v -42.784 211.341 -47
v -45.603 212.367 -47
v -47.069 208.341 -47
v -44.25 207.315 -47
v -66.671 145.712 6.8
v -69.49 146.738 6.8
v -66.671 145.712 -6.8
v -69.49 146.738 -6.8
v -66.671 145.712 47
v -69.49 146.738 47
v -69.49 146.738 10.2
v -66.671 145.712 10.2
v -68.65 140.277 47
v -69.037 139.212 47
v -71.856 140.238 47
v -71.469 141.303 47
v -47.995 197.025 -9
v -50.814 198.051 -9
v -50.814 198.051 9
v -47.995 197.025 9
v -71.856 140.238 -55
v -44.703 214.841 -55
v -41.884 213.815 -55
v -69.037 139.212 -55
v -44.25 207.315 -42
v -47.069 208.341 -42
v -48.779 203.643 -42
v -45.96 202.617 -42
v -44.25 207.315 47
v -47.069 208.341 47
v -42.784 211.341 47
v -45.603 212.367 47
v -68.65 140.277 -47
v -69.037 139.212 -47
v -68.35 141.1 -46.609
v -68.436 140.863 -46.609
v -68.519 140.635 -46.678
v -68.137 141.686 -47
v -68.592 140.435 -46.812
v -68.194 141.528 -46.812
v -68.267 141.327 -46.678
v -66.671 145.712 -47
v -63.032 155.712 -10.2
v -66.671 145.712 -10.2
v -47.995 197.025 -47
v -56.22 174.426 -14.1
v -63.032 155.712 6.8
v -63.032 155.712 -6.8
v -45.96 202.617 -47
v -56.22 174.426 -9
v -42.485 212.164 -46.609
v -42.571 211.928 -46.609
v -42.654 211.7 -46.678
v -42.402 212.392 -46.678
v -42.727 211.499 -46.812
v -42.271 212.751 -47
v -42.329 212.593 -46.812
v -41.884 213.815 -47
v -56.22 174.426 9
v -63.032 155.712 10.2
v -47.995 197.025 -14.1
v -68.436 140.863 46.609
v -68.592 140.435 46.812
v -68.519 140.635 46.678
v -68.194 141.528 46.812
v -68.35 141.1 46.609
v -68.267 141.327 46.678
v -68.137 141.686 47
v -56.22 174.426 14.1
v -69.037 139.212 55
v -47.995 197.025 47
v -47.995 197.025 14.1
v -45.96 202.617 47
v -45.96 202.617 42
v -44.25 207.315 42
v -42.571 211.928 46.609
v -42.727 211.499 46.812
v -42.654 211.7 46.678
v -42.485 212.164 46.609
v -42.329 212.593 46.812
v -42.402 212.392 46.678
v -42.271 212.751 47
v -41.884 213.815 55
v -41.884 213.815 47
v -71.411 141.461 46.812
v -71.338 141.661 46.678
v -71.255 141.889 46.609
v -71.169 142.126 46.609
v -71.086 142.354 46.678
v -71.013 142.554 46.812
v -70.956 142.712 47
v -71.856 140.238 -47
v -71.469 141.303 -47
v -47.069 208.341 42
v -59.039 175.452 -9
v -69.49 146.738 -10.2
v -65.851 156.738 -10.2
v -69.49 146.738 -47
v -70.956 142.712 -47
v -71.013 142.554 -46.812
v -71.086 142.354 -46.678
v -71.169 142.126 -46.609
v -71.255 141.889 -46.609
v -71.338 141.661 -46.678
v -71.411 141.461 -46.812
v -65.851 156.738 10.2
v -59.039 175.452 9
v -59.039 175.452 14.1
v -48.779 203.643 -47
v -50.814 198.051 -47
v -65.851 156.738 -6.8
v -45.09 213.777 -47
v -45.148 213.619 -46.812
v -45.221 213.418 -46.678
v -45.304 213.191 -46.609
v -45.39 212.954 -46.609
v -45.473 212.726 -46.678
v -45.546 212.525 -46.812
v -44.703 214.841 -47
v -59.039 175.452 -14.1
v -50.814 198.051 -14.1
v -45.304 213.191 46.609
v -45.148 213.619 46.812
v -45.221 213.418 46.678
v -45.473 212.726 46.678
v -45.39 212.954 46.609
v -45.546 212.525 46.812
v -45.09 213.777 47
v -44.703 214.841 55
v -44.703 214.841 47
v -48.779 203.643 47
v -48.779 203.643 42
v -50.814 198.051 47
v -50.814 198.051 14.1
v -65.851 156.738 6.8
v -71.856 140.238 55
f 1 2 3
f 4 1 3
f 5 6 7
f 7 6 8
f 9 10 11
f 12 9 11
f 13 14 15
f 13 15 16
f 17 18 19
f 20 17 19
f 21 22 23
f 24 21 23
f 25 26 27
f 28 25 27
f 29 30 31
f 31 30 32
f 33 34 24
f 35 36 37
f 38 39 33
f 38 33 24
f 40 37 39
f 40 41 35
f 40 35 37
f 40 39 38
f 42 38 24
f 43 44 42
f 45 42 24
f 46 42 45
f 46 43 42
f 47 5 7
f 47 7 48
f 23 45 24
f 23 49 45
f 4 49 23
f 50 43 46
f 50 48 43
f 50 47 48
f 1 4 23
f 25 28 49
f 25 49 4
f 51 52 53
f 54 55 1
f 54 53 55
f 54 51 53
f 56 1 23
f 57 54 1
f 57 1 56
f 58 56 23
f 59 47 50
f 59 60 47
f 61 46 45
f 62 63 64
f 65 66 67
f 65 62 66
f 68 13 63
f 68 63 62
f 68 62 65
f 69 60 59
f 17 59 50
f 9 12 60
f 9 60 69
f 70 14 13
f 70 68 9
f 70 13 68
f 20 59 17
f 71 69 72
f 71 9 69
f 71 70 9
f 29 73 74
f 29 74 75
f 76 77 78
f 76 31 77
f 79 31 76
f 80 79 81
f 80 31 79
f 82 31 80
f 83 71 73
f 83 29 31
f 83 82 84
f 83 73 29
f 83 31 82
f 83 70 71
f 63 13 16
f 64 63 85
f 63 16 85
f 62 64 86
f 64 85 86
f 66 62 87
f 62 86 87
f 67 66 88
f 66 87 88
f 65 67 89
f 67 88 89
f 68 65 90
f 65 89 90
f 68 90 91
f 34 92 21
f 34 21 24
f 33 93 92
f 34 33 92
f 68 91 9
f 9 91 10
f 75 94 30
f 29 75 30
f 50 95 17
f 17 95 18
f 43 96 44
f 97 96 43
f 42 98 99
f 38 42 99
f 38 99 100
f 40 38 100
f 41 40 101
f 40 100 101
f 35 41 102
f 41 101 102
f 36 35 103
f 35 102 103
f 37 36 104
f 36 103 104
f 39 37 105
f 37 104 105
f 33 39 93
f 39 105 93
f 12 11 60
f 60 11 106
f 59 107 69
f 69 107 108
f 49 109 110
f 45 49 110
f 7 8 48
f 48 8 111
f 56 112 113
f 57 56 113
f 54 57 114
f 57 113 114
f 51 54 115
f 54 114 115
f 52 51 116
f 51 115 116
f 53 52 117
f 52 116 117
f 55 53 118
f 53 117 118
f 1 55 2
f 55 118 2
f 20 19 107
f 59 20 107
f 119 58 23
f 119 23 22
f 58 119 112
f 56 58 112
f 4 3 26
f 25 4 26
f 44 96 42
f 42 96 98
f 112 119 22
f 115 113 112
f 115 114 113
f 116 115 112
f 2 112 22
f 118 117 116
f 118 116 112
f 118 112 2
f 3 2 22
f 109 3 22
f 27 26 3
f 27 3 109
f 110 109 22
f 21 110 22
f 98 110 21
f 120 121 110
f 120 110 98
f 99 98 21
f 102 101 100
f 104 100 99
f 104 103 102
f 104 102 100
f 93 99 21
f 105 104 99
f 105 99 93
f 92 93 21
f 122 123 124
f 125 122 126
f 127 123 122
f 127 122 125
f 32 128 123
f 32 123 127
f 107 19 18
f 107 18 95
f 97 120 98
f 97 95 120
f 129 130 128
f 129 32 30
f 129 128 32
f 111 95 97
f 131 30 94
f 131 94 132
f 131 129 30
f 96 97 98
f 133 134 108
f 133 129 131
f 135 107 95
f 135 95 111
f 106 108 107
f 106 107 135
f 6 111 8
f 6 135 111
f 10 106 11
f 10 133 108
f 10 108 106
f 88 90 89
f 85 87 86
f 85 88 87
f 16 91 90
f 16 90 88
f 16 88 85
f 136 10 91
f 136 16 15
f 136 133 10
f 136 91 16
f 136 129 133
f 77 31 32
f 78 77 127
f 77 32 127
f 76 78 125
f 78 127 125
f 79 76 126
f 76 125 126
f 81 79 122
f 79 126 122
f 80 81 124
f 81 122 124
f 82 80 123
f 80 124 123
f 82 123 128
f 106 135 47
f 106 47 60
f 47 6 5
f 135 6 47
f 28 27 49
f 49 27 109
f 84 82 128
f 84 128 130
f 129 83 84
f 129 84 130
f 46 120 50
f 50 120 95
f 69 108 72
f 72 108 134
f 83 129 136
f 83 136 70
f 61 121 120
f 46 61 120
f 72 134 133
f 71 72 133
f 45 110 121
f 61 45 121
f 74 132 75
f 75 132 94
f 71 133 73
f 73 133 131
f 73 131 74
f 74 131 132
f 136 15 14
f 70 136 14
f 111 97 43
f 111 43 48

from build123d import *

# Parameters (mm, degrees)
BOSS_EXTRUDE1_DEPTH       = 55
TOP_TAB_NOTCH_REACH       = 197.475
BOTTOM_TAB_NOTCH_REACH    = 197.475
BOTTOM_CENTER_SLOTS_REACH = 197.475
SKETCH6_W                 = 3.4
SKETCH6_H                 = 10.641777725


with BuildPart() as part:
    # Sketch1 → Boss-Extrude1 (new, symmetric)
    with BuildSketch(Plane.XY):
        Polygon((-44.702851081, 214.841310922), (-71.856111855, 140.238340079), (-69.037033993, 139.212279649), (-41.883773219, 213.815250492), align=None)
    extrude(amount=BOSS_EXTRUDE1_DEPTH, both=True)

    # Sketch3 → top tab notch (cut, up to next)
    with BuildSketch(Plane(origin=(-108.522277226, 39.498878665, 0), x_dir=(0, 0, 1), z_dir=(-0.9396926207859095, 0.34202014332566577, 0)), mode=Mode.PRIVATE) as top_tab_notch_sk1:
        with BuildLine():
            Line((47, 186.595518979), (-47, 186.595518979))
            Line((-47, 186.595518979), (-47, 185.462807478))
            ThreePointArc((-47, 185.462807478), (-46.6, 184.712807478), (-47, 183.962807478))
            Line((-47, 183.962807478), (-47, 179.678363458))
            Line((-47, 179.678363458), (-42, 179.678363458))
            Line((-42, 179.678363458), (-42, 174.678363458))
            Line((-42, 174.678363458), (-47, 174.678363458))
            Line((-47, 174.678363458), (-47, 168.728030606))
            Line((-47, 168.728030606), (-14.1, 168.728030606))
            Line((-14.1, 168.728030606), (-14.1, 144.678363458))
            Line((-14.1, 144.678363458), (-9, 144.678363458))
            Line((-9, 144.678363458), (-9, 168.728030606))
            Line((-9, 168.728030606), (9, 168.728030606))
            Line((9, 168.728030606), (9, 144.678363458))
            Line((9, 144.678363458), (14.1, 144.678363458))
            Line((14.1, 144.678363458), (14.1, 168.728030606))
            Line((14.1, 168.728030606), (47, 168.728030606))
            Line((47, 168.728030606), (47, 174.678363458))
            Line((47, 174.678363458), (42, 174.678363458))
            Line((42, 174.678363458), (42, 179.678363458))
            Line((42, 179.678363458), (47, 179.678363458))
            Line((47, 179.678363458), (47, 183.962807478))
            ThreePointArc((47, 183.962807478), (46.6, 184.712807478), (47, 185.462807478))
            Line((47, 185.462807478), (47, 186.595518979))
        make_face()
    top_tab_notch_tool1 = extrude(top_tab_notch_sk1.sketch, amount=-TOP_TAB_NOTCH_REACH, mode=Mode.PRIVATE) & part.part
    add(top_tab_notch_tool1.solids().sort_by_distance((-48.693367, 203.877457, 0))[0], mode=Mode.SUBTRACT)

    # Sketch5 → bottom tab notch (cut, up to next)
    with BuildSketch(Plane(origin=(-108.522277226, 39.498878665, 0), x_dir=(0, 0, 1), z_dir=(-0.9396926207859096, 0.34202014332566527, 0)), mode=Mode.PRIVATE) as bottom_tab_notch_sk1:
        with BuildLine():
            Line((47, 107.204695648), (47, 108.337407149))
            ThreePointArc((47, 108.337407149), (46.6, 109.087407149), (47, 109.837407149))
            Line((47, 109.837407149), (47, 114.121851169))
            Line((47, 114.121851169), (-47, 114.121851169))
            Line((-47, 114.121851169), (-47, 109.837407149))
            ThreePointArc((-47, 109.837407149), (-46.6, 109.087407149), (-47, 108.337407149))
            Line((-47, 108.337407149), (-47, 107.204695648))
            Line((-47, 107.204695648), (47, 107.204695648))
        make_face()
    bottom_tab_notch_tool1 = extrude(bottom_tab_notch_sk1.sketch, amount=-BOTTOM_TAB_NOTCH_REACH, mode=Mode.PRIVATE) & part.part
    add(bottom_tab_notch_tool1.solids().sort_by_distance((-70.672508, 143.490264, 0))[0], mode=Mode.SUBTRACT)

    # Sketch6 → bottom center slots (cut, up to next)
    with BuildSketch(Plane(origin=(-108.522277226, 39.498878665, 0), x_dir=(0, 0, 1), z_dir=(-0.9396926207859096, 0.34202014332566527, 0)), mode=Mode.PRIVATE) as bottom_center_slots_sk1:
        with Locations((8.5, 119.442740032)):
            Rectangle(SKETCH6_W, SKETCH6_H)
    bottom_center_slots_tool1 = extrude(bottom_center_slots_sk1.sketch, amount=-BOTTOM_CENTER_SLOTS_REACH, mode=Mode.PRIVATE) & part.part
    # Sketch6 → bottom center slots (cut, up to next)
    with BuildSketch(Plane(origin=(-108.522277226, 39.498878665, 0), x_dir=(0, 0, 1), z_dir=(-0.9396926207859096, 0.34202014332566527, 0)), mode=Mode.PRIVATE) as bottom_center_slots_sk2:
        with Locations((-8.5, 119.442740032)):
            Rectangle(SKETCH6_W, SKETCH6_H)
    bottom_center_slots_tool2 = extrude(bottom_center_slots_sk2.sketch, amount=-BOTTOM_CENTER_SLOTS_REACH, mode=Mode.PRIVATE) & part.part
    add(bottom_center_slots_tool1.solids().sort_by_distance((-67.670454, 151.73834, 8.5))[0], mode=Mode.SUBTRACT)
    add(bottom_center_slots_tool2.solids().sort_by_distance((-67.670454, 151.73834, -8.5))[0], mode=Mode.SUBTRACT)


solid = part.part
